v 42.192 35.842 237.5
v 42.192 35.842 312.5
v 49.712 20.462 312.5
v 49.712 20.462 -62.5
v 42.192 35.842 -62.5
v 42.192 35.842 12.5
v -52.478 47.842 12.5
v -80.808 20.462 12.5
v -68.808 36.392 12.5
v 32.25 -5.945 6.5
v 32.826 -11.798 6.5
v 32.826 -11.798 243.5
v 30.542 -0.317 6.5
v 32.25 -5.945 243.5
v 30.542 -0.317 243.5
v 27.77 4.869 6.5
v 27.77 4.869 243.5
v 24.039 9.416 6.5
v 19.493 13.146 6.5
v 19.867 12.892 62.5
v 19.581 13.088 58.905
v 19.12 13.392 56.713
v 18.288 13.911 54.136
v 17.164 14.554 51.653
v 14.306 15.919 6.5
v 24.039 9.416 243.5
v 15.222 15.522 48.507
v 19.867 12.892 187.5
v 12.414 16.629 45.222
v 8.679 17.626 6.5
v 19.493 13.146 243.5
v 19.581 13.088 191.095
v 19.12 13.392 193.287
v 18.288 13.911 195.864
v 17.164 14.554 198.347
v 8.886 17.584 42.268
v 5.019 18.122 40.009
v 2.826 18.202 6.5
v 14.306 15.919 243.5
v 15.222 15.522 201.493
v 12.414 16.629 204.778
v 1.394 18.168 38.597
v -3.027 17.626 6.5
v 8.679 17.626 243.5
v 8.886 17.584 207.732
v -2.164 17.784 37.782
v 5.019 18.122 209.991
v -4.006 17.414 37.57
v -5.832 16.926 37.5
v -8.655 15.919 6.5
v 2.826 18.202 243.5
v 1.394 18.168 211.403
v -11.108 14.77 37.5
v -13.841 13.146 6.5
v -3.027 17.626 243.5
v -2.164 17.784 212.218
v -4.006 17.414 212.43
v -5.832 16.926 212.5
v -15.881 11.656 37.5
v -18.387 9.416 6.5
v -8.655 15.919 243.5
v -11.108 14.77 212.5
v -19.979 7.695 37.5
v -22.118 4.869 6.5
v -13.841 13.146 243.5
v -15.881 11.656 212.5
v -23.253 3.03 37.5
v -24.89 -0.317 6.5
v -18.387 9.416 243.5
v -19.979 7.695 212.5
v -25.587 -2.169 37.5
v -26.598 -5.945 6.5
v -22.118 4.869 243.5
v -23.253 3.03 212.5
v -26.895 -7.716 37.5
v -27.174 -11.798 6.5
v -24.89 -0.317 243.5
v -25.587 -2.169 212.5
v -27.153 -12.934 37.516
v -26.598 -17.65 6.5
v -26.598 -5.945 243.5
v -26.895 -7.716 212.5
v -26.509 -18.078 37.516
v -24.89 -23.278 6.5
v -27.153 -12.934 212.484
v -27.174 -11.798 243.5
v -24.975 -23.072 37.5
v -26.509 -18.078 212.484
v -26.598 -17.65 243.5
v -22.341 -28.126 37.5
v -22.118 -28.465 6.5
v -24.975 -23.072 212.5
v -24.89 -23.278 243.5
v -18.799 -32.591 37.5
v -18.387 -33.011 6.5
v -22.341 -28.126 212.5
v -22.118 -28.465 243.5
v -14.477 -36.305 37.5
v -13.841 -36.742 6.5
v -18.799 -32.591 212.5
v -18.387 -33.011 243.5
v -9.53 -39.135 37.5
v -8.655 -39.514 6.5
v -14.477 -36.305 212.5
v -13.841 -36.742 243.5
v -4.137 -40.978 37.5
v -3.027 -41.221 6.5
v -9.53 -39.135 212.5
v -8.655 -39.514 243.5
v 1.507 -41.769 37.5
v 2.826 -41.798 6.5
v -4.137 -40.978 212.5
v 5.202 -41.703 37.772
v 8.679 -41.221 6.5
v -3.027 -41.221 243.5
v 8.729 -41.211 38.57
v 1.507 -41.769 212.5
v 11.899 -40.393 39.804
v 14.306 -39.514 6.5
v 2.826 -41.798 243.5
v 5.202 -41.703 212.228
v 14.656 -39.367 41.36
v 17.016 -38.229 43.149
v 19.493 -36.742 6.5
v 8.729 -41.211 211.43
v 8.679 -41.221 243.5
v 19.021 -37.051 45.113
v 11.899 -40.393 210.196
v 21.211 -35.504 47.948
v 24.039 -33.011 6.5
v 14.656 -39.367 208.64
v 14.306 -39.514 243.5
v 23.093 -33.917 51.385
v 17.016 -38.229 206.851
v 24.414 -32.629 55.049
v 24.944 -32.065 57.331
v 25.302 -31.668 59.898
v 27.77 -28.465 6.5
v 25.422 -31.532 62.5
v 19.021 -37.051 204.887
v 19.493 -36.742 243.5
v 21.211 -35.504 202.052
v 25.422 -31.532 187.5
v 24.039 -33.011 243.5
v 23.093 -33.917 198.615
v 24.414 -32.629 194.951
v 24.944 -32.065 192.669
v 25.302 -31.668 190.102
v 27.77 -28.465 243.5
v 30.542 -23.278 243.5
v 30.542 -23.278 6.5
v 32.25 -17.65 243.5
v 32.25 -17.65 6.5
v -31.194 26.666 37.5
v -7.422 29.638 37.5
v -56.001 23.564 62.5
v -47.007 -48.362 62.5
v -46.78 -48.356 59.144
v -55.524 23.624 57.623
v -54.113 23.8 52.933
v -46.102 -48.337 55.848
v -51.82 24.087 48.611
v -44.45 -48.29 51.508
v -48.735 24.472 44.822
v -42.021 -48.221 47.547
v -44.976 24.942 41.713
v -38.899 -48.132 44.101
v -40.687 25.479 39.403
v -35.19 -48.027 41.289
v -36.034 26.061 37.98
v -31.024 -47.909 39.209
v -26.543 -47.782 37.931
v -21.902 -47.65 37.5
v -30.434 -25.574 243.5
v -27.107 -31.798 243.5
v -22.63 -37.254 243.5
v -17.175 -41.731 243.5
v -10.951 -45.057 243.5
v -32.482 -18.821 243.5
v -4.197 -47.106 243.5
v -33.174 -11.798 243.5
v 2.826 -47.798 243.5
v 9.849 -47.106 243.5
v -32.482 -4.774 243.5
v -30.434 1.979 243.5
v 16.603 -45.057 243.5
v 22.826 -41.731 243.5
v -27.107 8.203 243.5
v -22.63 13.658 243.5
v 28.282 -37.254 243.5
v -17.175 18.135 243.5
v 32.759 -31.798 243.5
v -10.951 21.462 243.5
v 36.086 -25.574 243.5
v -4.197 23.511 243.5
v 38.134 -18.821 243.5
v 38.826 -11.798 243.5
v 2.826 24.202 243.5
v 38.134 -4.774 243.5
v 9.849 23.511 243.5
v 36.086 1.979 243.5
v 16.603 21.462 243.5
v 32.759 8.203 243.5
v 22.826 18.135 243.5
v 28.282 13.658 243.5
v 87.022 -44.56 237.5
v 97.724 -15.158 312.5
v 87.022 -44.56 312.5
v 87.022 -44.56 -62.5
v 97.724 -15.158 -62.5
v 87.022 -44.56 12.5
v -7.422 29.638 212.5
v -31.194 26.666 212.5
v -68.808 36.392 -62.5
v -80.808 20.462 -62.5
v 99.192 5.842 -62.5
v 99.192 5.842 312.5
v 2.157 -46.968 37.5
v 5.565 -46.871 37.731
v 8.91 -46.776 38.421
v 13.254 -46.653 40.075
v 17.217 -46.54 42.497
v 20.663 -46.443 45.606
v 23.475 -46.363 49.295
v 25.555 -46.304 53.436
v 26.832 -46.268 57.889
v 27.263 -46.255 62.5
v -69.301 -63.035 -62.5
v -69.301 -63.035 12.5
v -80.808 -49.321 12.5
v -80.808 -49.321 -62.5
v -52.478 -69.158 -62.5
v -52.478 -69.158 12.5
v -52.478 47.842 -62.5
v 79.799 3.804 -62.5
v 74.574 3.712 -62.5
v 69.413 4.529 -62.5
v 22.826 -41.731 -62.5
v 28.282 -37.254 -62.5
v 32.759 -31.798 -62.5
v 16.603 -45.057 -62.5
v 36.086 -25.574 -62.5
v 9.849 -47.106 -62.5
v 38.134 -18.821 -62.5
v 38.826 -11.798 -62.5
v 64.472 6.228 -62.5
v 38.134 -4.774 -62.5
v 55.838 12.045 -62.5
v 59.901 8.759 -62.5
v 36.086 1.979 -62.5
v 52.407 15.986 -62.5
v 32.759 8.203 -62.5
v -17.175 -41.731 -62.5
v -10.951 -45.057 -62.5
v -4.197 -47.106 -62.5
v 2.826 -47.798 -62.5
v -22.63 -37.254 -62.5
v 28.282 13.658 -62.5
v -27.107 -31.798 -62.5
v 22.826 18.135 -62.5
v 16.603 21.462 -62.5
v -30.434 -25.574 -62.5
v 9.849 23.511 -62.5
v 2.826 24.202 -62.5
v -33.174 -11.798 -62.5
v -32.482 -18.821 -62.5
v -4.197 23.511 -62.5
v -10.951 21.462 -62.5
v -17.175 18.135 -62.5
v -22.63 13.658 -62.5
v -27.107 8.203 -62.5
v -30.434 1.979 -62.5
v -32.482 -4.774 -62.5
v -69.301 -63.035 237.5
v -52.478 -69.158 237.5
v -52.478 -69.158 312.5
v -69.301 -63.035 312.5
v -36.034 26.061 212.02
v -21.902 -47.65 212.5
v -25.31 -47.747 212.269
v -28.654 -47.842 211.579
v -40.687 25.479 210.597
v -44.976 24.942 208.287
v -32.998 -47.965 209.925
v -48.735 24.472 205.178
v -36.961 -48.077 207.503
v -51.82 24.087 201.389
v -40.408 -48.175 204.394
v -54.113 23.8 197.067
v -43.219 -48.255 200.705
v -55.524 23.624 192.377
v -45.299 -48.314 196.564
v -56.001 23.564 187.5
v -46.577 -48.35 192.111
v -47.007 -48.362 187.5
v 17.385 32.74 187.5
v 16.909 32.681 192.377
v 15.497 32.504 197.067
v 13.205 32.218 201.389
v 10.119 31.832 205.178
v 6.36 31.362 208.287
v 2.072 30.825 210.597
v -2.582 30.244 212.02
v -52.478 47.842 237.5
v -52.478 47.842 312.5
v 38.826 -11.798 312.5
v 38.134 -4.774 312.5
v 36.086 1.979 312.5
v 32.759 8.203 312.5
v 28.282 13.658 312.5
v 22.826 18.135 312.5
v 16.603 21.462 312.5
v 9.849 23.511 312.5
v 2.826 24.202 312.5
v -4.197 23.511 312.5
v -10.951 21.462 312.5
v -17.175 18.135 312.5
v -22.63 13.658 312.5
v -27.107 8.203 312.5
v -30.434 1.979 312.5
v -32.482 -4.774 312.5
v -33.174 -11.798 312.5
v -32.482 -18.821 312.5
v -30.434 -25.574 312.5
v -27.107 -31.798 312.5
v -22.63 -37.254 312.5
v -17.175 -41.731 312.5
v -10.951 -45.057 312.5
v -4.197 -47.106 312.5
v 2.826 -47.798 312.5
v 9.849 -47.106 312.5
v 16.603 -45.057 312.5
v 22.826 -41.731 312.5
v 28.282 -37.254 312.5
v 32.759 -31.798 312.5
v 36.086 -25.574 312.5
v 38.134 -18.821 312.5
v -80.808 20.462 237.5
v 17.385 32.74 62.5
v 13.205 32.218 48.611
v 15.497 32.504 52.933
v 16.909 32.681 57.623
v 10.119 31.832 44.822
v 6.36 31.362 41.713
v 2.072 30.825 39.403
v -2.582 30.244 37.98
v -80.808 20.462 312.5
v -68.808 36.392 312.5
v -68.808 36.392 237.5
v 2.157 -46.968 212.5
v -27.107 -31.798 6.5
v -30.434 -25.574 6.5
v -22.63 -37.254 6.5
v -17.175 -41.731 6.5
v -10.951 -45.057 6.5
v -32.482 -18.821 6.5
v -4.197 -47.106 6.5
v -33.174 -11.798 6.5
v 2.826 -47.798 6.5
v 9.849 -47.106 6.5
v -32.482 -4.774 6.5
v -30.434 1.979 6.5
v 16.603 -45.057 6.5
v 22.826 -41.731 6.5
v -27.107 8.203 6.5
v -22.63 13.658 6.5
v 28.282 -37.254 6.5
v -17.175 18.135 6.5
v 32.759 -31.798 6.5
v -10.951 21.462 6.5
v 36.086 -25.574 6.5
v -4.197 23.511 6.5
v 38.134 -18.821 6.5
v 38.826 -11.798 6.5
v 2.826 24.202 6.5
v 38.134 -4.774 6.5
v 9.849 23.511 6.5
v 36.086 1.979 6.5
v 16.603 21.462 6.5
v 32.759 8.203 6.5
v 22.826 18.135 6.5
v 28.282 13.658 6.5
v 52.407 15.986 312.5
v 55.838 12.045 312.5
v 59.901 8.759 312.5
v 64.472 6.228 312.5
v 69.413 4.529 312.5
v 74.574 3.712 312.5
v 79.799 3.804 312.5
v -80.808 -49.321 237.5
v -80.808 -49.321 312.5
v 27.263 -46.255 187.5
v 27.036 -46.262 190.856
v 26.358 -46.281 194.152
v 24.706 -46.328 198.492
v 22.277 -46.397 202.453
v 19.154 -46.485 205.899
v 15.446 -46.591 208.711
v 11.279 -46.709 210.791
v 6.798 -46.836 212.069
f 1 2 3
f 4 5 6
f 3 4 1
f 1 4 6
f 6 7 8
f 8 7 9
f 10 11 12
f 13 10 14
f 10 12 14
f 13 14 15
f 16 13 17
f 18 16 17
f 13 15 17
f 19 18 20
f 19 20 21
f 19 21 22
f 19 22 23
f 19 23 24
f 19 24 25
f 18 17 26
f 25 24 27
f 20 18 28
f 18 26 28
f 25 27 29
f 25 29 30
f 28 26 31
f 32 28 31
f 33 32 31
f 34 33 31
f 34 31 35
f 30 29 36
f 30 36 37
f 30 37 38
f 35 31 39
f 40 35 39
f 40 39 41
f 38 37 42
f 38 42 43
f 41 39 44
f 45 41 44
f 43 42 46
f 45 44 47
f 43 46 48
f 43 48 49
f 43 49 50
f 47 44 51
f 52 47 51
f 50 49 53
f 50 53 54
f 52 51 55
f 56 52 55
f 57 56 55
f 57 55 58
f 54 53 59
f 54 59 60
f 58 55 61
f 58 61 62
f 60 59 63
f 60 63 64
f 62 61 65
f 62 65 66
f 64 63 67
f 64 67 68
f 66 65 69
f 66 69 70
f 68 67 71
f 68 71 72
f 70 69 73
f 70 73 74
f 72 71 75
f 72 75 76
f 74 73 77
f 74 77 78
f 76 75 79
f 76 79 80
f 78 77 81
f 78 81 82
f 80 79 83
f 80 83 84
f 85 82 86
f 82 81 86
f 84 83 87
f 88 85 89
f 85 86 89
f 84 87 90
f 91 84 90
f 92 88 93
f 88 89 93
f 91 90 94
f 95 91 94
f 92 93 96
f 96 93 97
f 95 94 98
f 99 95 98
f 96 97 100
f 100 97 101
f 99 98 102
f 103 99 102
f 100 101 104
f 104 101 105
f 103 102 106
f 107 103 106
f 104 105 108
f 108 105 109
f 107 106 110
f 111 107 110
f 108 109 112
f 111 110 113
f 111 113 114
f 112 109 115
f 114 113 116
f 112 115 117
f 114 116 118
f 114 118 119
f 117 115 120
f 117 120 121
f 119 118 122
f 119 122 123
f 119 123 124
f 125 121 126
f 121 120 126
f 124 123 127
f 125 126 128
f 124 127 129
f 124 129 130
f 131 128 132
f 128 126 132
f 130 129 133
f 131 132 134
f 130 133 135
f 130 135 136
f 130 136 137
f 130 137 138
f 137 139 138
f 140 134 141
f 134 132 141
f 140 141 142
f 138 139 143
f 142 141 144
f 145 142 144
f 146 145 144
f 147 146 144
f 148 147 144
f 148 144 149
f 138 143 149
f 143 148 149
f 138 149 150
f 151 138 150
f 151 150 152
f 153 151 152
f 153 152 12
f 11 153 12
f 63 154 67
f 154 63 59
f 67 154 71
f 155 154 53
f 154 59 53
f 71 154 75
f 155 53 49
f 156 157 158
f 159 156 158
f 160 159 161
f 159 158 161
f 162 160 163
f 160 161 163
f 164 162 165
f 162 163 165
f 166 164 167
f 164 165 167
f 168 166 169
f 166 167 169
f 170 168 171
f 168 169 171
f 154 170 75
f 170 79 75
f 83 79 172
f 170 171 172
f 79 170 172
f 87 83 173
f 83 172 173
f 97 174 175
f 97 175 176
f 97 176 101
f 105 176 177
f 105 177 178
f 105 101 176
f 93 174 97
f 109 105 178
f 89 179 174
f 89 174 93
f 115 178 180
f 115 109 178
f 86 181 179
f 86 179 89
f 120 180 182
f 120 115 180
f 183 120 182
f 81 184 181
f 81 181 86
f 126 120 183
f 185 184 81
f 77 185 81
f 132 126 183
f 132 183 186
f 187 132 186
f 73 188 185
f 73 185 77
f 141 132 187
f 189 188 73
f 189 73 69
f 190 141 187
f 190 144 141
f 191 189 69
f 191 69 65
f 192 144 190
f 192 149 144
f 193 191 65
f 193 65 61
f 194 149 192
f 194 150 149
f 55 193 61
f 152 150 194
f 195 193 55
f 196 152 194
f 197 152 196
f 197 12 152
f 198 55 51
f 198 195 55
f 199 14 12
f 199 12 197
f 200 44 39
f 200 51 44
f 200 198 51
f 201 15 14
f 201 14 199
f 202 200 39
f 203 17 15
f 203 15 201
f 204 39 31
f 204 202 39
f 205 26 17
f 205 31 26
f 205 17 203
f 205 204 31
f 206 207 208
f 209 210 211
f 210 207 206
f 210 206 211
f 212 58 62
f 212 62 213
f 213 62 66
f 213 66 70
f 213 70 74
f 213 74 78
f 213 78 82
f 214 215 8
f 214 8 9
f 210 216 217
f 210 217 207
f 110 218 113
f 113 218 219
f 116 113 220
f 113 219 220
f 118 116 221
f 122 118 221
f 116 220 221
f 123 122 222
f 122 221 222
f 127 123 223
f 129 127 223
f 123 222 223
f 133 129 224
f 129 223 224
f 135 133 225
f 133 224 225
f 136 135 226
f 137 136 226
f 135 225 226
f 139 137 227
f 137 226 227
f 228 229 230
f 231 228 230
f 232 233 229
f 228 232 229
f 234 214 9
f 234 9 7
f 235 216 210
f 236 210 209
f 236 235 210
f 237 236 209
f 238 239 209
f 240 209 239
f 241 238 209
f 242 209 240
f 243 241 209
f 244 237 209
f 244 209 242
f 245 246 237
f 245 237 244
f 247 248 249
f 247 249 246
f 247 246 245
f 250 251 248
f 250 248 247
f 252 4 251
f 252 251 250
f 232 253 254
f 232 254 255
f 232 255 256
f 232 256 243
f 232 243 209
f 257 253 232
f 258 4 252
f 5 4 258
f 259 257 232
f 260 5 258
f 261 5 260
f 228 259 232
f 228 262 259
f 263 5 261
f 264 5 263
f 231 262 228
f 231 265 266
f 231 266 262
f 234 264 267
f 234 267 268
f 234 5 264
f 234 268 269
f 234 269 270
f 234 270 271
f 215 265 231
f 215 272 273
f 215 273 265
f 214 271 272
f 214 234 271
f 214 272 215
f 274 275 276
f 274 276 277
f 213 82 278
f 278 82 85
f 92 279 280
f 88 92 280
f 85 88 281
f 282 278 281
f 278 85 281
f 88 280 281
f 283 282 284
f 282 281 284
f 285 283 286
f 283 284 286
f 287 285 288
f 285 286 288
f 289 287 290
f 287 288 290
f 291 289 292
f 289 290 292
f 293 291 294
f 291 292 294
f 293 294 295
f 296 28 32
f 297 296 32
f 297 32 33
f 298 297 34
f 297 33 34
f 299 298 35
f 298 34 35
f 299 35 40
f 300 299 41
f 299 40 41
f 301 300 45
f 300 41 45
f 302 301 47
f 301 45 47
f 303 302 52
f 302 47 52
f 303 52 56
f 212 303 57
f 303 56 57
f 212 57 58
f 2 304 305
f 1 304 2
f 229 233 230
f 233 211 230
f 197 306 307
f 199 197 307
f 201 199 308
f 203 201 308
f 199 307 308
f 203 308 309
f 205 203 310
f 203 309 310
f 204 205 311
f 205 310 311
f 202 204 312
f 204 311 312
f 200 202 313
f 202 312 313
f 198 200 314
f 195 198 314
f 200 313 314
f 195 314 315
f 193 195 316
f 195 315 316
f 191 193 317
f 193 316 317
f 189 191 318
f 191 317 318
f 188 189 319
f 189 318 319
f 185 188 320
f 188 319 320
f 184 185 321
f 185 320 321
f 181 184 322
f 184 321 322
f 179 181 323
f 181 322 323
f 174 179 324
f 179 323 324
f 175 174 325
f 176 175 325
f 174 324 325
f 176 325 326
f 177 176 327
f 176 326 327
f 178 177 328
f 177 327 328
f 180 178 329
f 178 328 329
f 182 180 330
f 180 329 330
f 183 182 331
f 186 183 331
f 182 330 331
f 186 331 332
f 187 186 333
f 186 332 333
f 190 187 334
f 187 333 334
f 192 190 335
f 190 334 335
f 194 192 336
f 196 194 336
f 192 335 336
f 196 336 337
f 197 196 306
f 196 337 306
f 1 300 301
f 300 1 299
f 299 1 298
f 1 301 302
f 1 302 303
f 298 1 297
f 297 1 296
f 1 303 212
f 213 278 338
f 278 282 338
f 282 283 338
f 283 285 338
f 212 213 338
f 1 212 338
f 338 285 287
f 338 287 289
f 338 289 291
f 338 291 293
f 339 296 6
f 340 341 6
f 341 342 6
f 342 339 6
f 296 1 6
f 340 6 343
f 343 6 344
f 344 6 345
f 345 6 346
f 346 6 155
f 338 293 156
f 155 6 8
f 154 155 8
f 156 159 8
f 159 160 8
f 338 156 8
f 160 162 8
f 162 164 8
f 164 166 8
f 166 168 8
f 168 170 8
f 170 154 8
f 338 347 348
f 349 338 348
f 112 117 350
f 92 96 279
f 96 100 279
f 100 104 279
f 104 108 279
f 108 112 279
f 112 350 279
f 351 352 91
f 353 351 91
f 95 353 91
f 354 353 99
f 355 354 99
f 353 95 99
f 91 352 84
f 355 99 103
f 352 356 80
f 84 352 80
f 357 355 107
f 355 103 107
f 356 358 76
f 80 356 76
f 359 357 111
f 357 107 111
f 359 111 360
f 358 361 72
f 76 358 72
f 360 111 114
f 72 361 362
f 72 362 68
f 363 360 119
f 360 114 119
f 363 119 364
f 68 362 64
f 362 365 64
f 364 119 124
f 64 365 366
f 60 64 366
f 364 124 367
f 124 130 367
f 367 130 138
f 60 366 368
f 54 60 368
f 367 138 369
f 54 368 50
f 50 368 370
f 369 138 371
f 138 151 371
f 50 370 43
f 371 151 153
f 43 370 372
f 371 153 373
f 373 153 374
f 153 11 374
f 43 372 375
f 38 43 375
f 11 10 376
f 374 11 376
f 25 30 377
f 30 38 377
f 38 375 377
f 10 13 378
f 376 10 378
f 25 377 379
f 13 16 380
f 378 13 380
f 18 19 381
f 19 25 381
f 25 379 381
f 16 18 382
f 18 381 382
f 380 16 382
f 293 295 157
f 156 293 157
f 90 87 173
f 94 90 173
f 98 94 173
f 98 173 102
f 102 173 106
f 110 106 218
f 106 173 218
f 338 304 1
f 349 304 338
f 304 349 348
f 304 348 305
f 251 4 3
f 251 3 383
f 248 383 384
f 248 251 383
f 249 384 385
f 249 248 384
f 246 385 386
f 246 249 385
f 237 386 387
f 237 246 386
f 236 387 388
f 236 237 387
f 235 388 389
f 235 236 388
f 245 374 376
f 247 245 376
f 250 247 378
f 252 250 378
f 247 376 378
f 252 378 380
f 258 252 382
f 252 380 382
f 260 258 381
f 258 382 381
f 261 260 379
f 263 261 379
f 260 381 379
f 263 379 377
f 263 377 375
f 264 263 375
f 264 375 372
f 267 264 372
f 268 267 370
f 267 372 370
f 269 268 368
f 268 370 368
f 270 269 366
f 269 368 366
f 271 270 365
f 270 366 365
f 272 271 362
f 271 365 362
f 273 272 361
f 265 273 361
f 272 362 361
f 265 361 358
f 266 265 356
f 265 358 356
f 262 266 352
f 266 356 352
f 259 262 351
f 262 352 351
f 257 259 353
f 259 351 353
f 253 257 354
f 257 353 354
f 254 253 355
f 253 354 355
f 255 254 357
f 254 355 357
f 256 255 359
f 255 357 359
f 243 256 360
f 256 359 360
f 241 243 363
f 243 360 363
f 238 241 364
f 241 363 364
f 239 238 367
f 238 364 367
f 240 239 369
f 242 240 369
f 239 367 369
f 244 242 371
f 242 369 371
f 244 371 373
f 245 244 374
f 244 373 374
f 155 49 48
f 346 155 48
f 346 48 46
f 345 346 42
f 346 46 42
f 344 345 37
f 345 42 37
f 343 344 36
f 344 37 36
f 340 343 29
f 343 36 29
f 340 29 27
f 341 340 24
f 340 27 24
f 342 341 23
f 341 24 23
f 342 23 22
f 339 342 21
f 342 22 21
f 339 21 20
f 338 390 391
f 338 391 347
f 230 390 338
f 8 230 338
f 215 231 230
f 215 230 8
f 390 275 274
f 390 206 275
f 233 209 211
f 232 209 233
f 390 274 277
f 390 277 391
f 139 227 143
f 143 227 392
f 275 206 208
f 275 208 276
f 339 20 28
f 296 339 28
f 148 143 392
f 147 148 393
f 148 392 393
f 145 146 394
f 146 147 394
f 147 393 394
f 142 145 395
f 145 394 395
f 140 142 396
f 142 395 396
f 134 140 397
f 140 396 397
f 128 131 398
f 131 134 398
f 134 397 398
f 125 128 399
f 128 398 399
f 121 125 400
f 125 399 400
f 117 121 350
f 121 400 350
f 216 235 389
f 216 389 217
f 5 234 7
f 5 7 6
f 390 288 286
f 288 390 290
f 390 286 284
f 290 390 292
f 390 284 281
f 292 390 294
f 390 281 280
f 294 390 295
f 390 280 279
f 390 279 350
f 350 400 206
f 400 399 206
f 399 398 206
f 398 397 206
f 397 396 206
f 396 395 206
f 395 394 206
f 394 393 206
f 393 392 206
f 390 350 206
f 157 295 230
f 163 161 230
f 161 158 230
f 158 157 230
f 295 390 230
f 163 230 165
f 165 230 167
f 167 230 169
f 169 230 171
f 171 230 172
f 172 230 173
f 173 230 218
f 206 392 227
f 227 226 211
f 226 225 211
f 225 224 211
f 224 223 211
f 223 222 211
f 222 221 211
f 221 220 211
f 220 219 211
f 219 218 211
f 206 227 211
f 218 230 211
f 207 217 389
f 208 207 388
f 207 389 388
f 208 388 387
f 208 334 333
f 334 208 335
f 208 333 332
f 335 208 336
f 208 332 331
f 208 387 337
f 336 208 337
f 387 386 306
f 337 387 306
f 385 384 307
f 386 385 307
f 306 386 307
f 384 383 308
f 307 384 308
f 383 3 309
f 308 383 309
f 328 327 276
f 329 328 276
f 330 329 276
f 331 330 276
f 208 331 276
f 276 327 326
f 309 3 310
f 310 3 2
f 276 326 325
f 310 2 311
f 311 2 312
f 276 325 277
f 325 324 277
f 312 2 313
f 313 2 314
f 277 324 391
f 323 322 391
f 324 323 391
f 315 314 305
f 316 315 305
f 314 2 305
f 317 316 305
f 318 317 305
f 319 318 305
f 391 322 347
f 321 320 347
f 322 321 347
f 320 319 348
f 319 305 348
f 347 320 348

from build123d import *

# Parameters (mm, degrees)
RESSALTO_EXTRUS_O1_DEPTH   = 250
ESCALA1_SCALE              = 1.5
CORTE_EXTRUS_O1_START      = -75
CORTE_EXTRUS_O1_DEPTH      = 225
CORTE_EXTRUS_O3_DEPTH      = 344.667466727
CORTE_EXTRUS_O3_DEPTH_BACK = 344.667466727
ESBO_O7_R                  = 36
CORTE_EXTRUS_O4_DEPTH      = 69
ESBO_O7_3_R                = 30
CORTE_EXTRUS_O5_DEPTH      = 395.013784799
CORTE_EXTRUS_O6_START      = -306
ESBO_O7_4_R                = 36
ESBO_O7_4_R_2              = 30
CORTE_EXTRUS_O6_DEPTH      = 69


with BuildPart() as part:
    # Esboço1 → Ressalto-extrusão1 (new body)
    with BuildSketch(Plane.XY):
        with BuildLine():
            Line((65, 0), (64.021024633, -14))
            Line((64.021024633, -14), (56.886629039, -33.601590794))
            Line((56.886629039, -33.601590794), (-36.113370961, -50))
            Line((-36.113370961, -50), (-47.32844057, -45.918048487))
            Line((-47.32844057, -45.918048487), (-55, -36.775439975))
            Line((-55, -36.775439975), (-55, 9.746573698))
            Line((-55, 9.746573698), (-47, 20.366669268))
            Line((-47, 20.366669268), (-36.113370961, 28))
            Line((-36.113370961, 28), (27, 20))
            Line((27, 20), (32.013345877, 9.746573698))
            ThreePointArc((32.013345877, 9.746573698), (40.293006212, 1.034435734), (52.07121536, -1.358870022))
            Line((52.07121536, -1.358870022), (65, 0))
        make_face()
    extrude(amount=RESSALTO_EXTRUS_O1_DEPTH)


with BuildPart() as part_1:
    # Escala1: scaled about (-3.384050485, -11.684350271, 125)
    add(part.part.scale(ESCALA1_SCALE).moved(Location((1.692025242, 5.842175135, -62.5))))

    # Esboço4 → Corte-extrusão1 (cut)
    with BuildSketch(Plane(origin=(0, 0, -62.5), x_dir=(-1, 0, 0), z_dir=(0, 0, -1)).offset(CORTE_EXTRUS_O1_START)):
        Polygon((69.300635612, -63.034897595), (80.807974757, -49.320984827), (-87.021968802, -44.560211056), (52.478031198, -69.157824864), align=None)
        Polygon((-42.192025243, 35.842175136), (80.807974757, 20.462035682), (68.807974757, 36.392179037), (52.478031198, 47.842175136), align=None)
    extrude(amount=-CORTE_EXTRUS_O1_DEPTH, mode=Mode.SUBTRACT)

    # Esboço6 → Corte-extrusão3 (cut, two sides: drawn at the far end of the back side and taken through both)
    with BuildSketch(Plane(origin=(-3.763238402, 30.095846977, 0), x_dir=(0.9922727729449546, 0.12407555791585548, 0), z_dir=(-0.12407555791585548, 0.9922727729449546, 0)).offset(-CORTE_EXTRUS_O3_DEPTH_BACK)):
        with BuildLine():
            Line((-27.644714695, -37.5), (-3.68686424, -37.5))
            ThreePointArc((-3.68686424, -37.5), (13.99080529, -44.82233047), (21.31313576, -62.5))
            Line((21.31313576, -62.5), (21.31313576, -187.5))
            ThreePointArc((21.31313576, -187.5), (13.99080529, -205.17766953), (-3.68686424, -212.5))
            Line((-3.68686424, -212.5), (-27.644714695, -212.5))
            ThreePointArc((-27.644714695, -212.5), (-45.322384225, -205.17766953), (-52.644714695, -187.5))
            Line((-52.644714695, -187.5), (-52.644714695, -62.5))
            ThreePointArc((-52.644714695, -62.5), (-45.322384225, -44.82233047), (-27.644714695, -37.5))
        make_face()
    extrude(amount=CORTE_EXTRUS_O3_DEPTH + CORTE_EXTRUS_O3_DEPTH_BACK, mode=Mode.SUBTRACT)

    # Esboço7 → Corte-extrusão4 (cut)
    with BuildSketch(Plane.XY.offset(312.5)):
        with Locations((2.82595792, -11.797691618)):
            Circle(ESBO_O7_R)
    extrude(amount=-CORTE_EXTRUS_O4_DEPTH, mode=Mode.SUBTRACT)

    # Esboço7<3> → Corte-extrusão5 (cut, through all)
    with BuildSketch(Plane.XY.offset(312.5)):
        with Locations((2.82595792, -11.797691618)):
            Circle(ESBO_O7_3_R)
    extrude(amount=-CORTE_EXTRUS_O5_DEPTH, mode=Mode.SUBTRACT)

    # Esboço7<4> → Corte-extrusão6 (cut)
    with BuildSketch(Plane.XY.offset(312.5).offset(CORTE_EXTRUS_O6_START)):
        with Locations((2.82595792, -11.797691618)):
            Circle(ESBO_O7_4_R)
        with Locations((2.82595792, -11.797691618)):
            Circle(ESBO_O7_4_R_2, mode=Mode.SUBTRACT)
    extrude(amount=-CORTE_EXTRUS_O6_DEPTH, mode=Mode.SUBTRACT)


solid = part_1.part
